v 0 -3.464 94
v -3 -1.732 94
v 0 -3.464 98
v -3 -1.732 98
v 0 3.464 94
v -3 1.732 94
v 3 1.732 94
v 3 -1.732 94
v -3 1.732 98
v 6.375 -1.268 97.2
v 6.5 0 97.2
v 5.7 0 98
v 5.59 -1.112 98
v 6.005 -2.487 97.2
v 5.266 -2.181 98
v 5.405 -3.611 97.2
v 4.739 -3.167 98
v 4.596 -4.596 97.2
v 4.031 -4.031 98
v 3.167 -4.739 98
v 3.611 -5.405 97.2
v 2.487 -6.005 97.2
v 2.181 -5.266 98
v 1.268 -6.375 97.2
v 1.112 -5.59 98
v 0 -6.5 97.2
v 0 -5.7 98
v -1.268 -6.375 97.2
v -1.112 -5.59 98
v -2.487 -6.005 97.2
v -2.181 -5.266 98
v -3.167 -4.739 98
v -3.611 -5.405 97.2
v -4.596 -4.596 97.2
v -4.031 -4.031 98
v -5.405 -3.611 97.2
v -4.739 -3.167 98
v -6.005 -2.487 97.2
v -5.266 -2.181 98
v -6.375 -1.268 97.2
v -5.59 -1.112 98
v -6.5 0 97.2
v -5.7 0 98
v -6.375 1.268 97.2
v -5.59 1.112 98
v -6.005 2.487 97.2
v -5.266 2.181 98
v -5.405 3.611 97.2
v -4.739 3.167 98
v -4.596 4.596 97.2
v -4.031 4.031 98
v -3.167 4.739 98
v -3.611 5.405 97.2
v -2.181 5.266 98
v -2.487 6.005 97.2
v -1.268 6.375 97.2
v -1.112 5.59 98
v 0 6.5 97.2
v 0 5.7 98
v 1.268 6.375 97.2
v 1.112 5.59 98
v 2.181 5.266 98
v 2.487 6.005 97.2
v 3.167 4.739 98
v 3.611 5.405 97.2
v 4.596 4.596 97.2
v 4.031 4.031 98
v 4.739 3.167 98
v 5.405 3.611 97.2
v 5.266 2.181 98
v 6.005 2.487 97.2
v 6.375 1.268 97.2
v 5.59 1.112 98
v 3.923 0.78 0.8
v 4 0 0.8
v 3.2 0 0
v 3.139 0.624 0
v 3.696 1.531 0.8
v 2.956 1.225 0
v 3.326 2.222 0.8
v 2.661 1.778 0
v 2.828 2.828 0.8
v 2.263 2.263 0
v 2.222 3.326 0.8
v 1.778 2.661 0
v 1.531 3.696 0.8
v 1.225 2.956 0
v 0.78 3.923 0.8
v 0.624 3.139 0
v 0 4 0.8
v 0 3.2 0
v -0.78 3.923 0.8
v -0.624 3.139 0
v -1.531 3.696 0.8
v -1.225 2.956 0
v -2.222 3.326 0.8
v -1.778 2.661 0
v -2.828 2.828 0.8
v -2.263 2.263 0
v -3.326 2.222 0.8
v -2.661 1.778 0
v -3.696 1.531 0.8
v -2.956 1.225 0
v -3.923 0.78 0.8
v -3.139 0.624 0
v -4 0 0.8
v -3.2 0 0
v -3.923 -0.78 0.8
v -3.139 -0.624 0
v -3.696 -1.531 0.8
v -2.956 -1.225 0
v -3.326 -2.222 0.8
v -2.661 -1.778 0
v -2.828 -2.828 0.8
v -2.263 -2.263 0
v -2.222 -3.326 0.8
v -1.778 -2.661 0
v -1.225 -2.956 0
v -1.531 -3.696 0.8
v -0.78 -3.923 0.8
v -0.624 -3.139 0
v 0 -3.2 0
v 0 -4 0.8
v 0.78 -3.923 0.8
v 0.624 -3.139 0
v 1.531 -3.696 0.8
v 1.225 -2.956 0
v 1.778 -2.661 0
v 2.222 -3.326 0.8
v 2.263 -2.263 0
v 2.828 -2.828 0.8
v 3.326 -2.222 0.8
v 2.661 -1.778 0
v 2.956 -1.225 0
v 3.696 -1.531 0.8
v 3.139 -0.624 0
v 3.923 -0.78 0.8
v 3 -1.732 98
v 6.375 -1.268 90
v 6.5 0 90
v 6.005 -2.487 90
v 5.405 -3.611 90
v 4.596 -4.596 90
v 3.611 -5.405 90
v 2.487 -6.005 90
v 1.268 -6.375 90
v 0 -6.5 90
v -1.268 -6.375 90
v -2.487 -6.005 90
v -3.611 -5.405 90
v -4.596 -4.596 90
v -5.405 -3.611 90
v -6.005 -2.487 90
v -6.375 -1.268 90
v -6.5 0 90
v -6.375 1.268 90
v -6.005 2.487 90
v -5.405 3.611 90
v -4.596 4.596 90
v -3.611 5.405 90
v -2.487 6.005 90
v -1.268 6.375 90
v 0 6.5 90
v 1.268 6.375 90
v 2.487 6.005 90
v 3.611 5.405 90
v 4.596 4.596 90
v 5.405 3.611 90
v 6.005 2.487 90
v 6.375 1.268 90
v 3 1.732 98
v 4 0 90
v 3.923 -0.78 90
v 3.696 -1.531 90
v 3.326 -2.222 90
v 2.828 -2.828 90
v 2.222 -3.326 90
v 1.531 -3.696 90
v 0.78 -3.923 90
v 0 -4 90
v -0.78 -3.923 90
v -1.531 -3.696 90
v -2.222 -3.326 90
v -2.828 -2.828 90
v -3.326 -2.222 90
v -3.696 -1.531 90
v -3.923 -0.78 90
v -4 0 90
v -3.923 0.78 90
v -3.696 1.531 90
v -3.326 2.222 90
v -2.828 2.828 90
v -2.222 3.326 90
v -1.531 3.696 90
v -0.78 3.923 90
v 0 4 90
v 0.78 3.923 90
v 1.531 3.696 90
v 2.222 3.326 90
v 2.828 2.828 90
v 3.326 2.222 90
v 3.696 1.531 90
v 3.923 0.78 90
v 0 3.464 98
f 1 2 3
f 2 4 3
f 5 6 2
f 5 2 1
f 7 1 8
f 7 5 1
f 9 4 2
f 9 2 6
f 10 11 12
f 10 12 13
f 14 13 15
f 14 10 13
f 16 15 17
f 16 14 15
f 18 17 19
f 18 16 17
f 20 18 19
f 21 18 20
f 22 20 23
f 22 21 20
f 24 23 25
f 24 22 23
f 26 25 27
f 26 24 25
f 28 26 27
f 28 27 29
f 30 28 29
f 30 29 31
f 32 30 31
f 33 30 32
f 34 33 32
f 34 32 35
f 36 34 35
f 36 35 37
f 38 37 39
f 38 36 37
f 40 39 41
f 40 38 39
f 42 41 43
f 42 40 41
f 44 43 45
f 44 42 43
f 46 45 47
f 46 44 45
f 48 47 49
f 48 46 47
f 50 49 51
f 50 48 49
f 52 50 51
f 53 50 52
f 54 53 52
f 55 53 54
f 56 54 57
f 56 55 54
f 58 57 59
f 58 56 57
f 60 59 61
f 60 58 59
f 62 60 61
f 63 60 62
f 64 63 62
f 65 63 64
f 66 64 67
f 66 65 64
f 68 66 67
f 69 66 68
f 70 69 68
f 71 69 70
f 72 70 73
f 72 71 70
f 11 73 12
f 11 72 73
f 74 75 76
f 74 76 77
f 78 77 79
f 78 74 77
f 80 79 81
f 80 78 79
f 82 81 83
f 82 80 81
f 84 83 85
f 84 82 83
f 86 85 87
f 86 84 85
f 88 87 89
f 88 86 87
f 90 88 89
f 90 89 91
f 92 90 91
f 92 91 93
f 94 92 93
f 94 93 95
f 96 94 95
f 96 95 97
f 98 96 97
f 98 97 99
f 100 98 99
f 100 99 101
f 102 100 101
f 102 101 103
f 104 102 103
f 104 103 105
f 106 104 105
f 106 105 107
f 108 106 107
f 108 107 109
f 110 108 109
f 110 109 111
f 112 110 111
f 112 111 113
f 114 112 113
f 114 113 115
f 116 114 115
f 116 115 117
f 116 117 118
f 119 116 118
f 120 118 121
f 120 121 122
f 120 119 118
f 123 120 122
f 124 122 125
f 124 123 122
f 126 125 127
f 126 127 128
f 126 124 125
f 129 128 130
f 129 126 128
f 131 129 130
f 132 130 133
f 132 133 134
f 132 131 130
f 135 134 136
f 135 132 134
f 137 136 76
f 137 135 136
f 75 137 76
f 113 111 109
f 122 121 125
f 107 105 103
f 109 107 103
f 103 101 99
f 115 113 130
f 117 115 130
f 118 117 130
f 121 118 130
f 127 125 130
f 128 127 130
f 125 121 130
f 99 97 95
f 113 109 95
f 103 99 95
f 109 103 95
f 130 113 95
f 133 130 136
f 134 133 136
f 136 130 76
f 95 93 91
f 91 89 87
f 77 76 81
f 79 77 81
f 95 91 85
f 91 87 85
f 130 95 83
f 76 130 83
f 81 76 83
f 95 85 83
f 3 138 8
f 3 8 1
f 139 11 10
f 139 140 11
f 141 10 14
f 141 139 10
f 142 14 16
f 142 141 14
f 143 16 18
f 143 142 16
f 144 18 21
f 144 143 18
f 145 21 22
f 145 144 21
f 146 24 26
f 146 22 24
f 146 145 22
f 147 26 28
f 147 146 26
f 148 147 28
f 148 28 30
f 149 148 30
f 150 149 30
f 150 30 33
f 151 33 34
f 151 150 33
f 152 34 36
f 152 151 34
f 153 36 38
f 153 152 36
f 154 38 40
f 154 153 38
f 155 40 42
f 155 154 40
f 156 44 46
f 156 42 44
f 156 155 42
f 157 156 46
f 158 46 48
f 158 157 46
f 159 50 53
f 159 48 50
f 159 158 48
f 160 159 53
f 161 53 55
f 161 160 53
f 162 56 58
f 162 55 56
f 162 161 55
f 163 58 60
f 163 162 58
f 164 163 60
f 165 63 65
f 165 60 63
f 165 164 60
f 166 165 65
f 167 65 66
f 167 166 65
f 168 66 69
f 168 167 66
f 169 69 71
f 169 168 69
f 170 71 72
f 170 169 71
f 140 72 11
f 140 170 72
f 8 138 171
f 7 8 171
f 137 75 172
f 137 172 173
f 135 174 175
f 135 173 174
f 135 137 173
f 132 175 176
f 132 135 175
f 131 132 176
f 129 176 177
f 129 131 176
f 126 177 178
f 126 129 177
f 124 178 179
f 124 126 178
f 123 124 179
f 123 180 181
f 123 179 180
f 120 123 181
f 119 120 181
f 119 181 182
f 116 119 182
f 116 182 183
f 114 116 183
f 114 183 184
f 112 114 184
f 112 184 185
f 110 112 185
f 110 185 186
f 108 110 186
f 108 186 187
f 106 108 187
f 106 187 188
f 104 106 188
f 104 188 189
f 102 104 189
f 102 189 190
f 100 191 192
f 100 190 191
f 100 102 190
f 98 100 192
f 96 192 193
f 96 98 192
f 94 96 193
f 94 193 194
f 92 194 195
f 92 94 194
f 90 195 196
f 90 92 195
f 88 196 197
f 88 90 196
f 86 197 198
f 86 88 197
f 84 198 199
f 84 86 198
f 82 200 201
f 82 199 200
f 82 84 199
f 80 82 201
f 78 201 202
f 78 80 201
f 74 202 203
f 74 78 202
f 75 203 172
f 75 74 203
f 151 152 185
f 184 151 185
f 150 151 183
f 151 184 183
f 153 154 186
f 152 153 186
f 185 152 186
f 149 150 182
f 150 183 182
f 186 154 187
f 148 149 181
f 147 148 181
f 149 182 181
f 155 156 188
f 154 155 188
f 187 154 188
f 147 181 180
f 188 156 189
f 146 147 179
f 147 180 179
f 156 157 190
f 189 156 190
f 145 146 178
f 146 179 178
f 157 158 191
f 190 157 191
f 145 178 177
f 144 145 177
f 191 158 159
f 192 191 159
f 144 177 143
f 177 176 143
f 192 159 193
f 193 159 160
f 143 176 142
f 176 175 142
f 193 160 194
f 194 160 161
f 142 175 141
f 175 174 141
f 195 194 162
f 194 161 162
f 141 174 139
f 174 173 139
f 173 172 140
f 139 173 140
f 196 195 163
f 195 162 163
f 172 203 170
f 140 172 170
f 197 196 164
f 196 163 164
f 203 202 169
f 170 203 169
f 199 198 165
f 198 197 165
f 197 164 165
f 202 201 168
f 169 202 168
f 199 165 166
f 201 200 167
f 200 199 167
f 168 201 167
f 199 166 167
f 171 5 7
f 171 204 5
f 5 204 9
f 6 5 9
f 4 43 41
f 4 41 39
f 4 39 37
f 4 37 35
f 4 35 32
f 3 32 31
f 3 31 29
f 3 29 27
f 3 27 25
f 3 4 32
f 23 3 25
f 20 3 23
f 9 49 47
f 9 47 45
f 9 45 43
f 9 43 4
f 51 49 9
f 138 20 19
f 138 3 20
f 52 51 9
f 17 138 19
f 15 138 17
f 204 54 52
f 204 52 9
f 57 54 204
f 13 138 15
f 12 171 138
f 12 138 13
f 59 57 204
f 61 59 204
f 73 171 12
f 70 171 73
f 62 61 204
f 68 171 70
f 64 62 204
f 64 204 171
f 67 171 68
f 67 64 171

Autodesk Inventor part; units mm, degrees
ref_plane "YZ Plane" through (0, 0, 0) normal (1, 0, 0) x (0, 1, 0)
ref_plane "XZ Plane" through (0, 0, 0) normal (0, 1, 0) x (-1, 0, 0)
ref_plane "XY Plane" through (0, 0, 0) normal (0, 0, 1) x (1, 0, 0)
sketch "Sketch1" plane through (0, 0, 0) normal (0, 0, 1) x (1, 0, 0)
  circle A0 centre (0, 0) radius 4
  dimension "Diameter" = 8
extrude "Extrusion1" add sketch "Sketch1" along normal blind 90
sketch "Sketch2" plane through (0, 0, 90) normal (0, 0, 1) x (1, 0, 0)
  circle A0 centre (0, 0) radius 4 projected
  circle A1 centre (0, 0) radius 6.5
  dimension "Head_Diameter" = 13
extrude "Extrusion2" add sketch "Sketch2" along normal blind 8 contours A0 | A1
sketch "Sketch3" plane through (0, 0, 98) normal (0, 0, 1) x (1, 0, 0)
  circle A0 centre (0, 0) radius 6.5 projected
  circle A1 centre (0, 0) radius 3.4641 construction
  line L0 (0, 3.4641) -> (3, 1.7321)
  line L1 (3, -1.7321) -> (3, 1.7321)
  line L2 (0, 3.4641) -> (-3, 1.7321)
  line L3 (-3, -1.7321) -> (-3, 1.7321)
  line L4 (-3, -1.7321) -> (0, -3.4641)
  line L5 (3, -1.7321) -> (0, -3.4641)
  dimension "Hex_Width" = 6
extrude "Extrusion3" cut sketch "Sketch3" against normal blind 4 contours L0 L1 L5 L4 L3 L2
thread "Thread1" size "M8x1.25" class "4g6g" standard "ANSI Metric M Profile" length 28
chamfer "Chamfer1" distance 0.8 angle 45 2 edges at (-6.5, 0, 98) (-4, 0, 0)
equation "\"d9\" = ThreadLength"
equation "\"d12\" = Chamfer"
equation "\"ThreadLength\" = 28"
equation "\"Chamfer\" = 0.8"
properties part number "SCREW,SOCKET HD,P,12.9,M8X1.25X90MM"
